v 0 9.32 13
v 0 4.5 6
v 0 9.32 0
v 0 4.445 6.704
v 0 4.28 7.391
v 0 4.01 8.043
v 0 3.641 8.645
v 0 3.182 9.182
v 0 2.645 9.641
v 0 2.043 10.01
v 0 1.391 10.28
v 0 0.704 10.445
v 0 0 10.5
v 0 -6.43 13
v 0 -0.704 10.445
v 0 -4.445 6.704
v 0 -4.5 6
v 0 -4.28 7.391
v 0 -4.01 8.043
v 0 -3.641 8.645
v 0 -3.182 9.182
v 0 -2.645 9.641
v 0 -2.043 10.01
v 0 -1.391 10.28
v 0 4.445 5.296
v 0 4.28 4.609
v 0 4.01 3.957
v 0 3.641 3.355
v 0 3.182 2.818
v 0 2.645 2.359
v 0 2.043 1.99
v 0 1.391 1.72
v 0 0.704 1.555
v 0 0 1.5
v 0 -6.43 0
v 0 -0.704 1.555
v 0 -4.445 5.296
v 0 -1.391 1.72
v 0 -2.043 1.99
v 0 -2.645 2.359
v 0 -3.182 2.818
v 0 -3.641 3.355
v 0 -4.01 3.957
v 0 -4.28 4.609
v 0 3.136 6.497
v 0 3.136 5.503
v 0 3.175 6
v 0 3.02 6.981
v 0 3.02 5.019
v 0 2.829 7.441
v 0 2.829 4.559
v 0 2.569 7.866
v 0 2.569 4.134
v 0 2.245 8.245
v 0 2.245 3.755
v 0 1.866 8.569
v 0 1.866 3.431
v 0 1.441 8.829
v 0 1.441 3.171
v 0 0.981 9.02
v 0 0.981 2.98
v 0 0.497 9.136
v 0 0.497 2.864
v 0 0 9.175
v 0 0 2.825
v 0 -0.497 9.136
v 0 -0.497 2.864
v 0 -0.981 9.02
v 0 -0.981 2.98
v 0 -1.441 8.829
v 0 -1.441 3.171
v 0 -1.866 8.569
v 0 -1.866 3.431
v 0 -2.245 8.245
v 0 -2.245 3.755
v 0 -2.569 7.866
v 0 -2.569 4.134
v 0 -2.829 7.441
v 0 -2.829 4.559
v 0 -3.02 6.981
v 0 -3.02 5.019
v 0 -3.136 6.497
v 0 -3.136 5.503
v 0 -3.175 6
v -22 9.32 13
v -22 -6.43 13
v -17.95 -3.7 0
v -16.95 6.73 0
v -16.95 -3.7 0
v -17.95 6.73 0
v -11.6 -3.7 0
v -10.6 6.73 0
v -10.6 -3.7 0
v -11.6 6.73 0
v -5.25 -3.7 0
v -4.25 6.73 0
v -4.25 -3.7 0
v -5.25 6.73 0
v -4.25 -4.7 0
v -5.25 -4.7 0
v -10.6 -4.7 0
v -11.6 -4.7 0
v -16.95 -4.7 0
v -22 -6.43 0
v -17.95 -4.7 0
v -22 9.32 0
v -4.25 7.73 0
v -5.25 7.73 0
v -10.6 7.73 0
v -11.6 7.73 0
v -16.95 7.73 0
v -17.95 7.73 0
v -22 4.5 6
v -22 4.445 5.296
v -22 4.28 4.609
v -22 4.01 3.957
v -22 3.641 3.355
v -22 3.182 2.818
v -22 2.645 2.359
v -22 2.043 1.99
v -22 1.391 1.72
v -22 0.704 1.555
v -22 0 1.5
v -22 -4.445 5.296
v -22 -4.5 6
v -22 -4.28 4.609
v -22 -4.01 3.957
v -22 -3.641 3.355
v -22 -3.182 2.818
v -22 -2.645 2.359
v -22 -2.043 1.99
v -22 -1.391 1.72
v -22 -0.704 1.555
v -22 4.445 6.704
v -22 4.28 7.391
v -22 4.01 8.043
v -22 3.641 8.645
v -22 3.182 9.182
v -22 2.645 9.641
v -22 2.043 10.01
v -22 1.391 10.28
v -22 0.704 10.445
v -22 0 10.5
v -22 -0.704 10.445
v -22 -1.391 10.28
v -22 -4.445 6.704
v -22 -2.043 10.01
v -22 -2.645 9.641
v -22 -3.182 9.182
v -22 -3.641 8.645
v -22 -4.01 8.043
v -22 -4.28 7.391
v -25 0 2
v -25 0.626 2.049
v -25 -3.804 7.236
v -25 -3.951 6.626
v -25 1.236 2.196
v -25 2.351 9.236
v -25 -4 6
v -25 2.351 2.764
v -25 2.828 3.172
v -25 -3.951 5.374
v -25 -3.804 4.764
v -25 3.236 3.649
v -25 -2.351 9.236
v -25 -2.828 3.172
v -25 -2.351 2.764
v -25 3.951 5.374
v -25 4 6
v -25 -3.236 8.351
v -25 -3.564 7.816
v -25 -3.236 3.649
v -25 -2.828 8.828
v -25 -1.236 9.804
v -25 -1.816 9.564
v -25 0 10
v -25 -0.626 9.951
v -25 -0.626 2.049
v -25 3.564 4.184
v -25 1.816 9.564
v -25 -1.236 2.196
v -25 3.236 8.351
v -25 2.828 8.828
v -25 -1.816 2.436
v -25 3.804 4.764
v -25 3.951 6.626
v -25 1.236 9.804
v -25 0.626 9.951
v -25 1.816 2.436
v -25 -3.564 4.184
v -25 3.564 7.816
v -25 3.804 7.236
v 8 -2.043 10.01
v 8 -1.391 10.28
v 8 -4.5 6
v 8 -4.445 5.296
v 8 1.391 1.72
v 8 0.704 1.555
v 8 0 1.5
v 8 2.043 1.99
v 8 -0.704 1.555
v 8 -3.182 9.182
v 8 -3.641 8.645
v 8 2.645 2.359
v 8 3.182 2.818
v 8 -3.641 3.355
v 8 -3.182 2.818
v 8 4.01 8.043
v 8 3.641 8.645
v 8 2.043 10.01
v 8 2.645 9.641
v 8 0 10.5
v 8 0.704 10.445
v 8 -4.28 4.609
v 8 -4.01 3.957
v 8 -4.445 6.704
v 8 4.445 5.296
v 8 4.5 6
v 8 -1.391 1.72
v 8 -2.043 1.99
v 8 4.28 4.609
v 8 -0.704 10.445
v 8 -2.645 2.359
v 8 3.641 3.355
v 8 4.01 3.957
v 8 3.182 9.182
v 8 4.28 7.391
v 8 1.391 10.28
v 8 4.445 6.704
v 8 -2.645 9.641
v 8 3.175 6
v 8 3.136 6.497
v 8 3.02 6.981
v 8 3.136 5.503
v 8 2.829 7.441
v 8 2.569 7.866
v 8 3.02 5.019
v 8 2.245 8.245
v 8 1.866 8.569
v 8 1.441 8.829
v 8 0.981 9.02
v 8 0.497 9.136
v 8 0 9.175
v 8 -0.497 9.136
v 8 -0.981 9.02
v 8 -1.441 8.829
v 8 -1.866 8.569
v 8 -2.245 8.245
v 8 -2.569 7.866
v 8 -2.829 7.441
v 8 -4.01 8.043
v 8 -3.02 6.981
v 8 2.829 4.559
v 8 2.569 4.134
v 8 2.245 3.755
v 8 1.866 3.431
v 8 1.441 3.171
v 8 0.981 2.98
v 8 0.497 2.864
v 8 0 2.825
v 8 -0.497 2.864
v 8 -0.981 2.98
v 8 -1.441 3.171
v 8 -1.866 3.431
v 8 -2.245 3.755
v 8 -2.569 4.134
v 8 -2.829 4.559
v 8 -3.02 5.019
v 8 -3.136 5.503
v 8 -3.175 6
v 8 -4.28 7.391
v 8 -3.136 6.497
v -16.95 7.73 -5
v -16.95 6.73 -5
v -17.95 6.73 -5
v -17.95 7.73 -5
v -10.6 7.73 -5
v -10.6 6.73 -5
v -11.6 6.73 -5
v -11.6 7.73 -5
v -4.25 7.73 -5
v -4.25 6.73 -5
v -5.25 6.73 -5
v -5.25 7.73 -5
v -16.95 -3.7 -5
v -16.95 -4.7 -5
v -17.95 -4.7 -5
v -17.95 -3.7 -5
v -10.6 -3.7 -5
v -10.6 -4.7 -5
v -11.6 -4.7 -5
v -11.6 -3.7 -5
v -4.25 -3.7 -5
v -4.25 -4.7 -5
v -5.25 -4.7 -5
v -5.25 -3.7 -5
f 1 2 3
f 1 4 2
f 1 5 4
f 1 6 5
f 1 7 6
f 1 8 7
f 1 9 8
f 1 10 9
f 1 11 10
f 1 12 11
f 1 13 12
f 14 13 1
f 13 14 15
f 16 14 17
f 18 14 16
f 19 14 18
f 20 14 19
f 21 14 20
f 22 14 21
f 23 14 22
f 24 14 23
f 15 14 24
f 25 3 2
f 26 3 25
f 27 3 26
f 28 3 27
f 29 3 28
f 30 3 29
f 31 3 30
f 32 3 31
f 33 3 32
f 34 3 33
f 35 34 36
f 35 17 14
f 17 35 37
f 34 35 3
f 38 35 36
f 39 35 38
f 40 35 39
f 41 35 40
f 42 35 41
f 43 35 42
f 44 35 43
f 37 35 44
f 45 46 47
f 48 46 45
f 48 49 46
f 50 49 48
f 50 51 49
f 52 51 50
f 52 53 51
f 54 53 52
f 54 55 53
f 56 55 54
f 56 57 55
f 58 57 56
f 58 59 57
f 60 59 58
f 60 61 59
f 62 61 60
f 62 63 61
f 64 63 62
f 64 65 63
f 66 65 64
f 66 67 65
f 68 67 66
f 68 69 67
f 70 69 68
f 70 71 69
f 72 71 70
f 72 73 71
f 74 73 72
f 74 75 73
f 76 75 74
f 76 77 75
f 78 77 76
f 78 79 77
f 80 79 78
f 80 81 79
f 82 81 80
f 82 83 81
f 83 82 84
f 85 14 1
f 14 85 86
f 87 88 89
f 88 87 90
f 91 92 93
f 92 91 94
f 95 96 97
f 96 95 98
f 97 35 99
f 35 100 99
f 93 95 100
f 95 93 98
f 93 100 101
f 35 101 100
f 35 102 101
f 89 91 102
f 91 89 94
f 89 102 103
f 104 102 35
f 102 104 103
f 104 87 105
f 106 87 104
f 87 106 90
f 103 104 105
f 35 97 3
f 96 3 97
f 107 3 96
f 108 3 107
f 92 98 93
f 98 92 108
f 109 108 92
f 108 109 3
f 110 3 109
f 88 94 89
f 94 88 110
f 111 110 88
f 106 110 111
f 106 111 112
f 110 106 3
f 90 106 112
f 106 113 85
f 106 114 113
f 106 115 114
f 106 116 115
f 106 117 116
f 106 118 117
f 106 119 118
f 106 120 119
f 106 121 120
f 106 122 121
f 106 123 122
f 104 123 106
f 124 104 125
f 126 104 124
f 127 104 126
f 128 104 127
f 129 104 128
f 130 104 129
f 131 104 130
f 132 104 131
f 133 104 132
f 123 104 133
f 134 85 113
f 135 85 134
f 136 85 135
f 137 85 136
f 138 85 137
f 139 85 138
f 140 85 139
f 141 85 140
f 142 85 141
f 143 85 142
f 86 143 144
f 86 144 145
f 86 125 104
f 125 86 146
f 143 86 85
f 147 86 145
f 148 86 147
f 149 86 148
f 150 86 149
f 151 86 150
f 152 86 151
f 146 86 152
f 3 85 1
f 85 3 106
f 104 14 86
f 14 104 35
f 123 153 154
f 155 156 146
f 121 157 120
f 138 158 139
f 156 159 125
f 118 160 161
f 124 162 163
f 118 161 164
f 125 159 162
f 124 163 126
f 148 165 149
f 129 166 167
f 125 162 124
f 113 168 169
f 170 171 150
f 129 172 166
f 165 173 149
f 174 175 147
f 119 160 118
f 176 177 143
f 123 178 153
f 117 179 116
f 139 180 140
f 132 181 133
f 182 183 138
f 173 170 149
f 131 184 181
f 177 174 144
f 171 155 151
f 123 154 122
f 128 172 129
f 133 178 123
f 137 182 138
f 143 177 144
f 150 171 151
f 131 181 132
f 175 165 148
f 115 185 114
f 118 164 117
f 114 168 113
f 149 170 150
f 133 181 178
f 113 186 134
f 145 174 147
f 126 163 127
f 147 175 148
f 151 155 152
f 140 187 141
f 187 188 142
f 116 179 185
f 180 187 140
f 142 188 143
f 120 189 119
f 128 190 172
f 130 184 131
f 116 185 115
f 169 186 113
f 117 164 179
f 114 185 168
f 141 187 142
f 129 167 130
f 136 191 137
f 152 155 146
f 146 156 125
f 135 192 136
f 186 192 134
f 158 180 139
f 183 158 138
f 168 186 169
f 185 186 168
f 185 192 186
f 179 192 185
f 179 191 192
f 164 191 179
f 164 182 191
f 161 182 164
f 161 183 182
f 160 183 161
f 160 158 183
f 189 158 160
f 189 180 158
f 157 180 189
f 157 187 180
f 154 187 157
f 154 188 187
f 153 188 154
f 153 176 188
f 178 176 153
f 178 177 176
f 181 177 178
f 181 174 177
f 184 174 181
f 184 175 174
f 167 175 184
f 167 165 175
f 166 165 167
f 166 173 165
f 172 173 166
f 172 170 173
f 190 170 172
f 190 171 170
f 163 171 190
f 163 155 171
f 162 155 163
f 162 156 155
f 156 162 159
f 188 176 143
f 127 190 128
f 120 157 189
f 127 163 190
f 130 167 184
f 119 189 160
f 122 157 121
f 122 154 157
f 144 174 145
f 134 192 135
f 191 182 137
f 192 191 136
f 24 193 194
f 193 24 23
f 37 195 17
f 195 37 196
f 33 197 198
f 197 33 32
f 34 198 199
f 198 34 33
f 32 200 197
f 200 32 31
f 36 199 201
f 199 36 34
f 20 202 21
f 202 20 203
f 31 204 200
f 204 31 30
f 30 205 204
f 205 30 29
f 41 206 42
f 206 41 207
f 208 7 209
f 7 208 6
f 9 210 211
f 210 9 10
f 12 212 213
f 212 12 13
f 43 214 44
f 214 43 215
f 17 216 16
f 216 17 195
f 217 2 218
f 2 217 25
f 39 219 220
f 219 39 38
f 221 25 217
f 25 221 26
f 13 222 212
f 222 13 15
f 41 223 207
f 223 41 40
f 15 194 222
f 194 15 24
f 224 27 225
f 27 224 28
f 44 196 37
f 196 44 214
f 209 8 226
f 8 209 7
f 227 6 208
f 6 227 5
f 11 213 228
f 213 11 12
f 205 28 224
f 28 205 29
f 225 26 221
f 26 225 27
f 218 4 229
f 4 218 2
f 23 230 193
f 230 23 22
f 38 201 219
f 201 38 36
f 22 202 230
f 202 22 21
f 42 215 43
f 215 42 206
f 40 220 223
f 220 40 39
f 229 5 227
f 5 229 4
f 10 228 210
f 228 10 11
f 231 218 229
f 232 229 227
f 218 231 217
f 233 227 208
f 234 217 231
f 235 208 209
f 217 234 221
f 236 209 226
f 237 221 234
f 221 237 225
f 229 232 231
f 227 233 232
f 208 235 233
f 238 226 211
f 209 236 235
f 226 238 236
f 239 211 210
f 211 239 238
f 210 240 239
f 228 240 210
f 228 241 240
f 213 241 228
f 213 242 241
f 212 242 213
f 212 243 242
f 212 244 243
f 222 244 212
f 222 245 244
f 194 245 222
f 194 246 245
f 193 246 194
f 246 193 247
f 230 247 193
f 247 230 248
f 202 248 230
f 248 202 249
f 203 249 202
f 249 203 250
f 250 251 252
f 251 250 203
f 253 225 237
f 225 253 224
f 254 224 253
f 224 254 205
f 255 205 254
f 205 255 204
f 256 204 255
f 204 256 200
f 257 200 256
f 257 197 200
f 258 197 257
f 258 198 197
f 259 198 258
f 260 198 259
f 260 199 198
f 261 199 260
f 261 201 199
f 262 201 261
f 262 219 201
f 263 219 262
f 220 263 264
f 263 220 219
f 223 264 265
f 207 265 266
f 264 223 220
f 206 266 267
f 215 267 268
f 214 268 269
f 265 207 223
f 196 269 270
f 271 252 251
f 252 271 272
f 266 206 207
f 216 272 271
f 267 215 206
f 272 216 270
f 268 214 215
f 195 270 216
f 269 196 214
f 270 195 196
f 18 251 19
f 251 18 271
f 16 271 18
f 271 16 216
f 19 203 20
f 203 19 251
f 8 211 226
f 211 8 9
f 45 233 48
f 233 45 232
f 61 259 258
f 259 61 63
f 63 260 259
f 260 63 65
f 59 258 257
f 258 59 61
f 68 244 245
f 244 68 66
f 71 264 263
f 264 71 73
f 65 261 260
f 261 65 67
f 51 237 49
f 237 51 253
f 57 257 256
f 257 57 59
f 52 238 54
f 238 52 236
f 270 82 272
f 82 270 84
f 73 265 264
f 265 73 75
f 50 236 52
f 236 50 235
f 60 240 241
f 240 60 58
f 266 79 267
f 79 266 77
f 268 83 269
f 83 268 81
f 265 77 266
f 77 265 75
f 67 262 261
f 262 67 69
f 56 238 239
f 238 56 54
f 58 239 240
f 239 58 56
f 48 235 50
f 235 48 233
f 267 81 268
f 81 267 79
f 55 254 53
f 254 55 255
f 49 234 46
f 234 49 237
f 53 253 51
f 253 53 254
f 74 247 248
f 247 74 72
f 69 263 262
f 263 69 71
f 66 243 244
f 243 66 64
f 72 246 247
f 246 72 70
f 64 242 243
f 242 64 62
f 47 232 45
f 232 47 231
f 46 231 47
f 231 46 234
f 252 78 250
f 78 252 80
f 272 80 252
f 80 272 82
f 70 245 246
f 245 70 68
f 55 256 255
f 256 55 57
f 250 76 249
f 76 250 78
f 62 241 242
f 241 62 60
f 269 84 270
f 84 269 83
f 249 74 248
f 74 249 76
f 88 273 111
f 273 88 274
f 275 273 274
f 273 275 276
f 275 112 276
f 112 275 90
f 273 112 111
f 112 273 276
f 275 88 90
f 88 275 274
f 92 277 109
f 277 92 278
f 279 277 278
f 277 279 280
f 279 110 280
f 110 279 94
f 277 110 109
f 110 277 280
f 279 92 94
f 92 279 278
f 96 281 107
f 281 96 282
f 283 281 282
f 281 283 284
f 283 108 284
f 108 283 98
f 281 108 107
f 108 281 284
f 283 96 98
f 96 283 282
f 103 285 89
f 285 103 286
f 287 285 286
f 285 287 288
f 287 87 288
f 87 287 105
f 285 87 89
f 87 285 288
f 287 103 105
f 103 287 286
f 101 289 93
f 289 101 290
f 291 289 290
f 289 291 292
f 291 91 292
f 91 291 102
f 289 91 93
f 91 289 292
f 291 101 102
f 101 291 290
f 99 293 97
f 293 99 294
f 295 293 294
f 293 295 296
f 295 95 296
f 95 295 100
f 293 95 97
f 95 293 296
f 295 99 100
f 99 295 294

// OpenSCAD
$fn=40;

red = [0.8,0.2,0.2];
black = [0.2,0.2,0.2];
silver = [0.75,0.75,0.75];
epsilon = 0.001;

// The model is centered on the barrel
pins = [ [-17.45,7.23],  [ -11.1,7.23 ], [-4.75,7.23], 
	 [-17.45,-4.2], [-11.1,-4.2], [-4.75,-4.2 ] ];

module body()
{
    union() {
	translate([-22,-6.43,0])
	    cube([22,15.75,13]);
	translate([-25,0,6]) {
	    rotate([0,90,0]) {
		cylinder(3,d1=8,d2=9);
	    }
	}
    }
}

module barrel()
{
    translate([0,0,6]) rotate([0,90,0]) {
	difference() {
	    cylinder(8,d=9);
	    cylinder(9,d=6.35);
	}
    }
}

union() {
    color(black) body();
    color(silver)
	barrel();
    // Pins
    color(silver) for (pos = pins)
	translate(pos) translate([0,0,-2]) cube([1,1,6], center=true);
}
